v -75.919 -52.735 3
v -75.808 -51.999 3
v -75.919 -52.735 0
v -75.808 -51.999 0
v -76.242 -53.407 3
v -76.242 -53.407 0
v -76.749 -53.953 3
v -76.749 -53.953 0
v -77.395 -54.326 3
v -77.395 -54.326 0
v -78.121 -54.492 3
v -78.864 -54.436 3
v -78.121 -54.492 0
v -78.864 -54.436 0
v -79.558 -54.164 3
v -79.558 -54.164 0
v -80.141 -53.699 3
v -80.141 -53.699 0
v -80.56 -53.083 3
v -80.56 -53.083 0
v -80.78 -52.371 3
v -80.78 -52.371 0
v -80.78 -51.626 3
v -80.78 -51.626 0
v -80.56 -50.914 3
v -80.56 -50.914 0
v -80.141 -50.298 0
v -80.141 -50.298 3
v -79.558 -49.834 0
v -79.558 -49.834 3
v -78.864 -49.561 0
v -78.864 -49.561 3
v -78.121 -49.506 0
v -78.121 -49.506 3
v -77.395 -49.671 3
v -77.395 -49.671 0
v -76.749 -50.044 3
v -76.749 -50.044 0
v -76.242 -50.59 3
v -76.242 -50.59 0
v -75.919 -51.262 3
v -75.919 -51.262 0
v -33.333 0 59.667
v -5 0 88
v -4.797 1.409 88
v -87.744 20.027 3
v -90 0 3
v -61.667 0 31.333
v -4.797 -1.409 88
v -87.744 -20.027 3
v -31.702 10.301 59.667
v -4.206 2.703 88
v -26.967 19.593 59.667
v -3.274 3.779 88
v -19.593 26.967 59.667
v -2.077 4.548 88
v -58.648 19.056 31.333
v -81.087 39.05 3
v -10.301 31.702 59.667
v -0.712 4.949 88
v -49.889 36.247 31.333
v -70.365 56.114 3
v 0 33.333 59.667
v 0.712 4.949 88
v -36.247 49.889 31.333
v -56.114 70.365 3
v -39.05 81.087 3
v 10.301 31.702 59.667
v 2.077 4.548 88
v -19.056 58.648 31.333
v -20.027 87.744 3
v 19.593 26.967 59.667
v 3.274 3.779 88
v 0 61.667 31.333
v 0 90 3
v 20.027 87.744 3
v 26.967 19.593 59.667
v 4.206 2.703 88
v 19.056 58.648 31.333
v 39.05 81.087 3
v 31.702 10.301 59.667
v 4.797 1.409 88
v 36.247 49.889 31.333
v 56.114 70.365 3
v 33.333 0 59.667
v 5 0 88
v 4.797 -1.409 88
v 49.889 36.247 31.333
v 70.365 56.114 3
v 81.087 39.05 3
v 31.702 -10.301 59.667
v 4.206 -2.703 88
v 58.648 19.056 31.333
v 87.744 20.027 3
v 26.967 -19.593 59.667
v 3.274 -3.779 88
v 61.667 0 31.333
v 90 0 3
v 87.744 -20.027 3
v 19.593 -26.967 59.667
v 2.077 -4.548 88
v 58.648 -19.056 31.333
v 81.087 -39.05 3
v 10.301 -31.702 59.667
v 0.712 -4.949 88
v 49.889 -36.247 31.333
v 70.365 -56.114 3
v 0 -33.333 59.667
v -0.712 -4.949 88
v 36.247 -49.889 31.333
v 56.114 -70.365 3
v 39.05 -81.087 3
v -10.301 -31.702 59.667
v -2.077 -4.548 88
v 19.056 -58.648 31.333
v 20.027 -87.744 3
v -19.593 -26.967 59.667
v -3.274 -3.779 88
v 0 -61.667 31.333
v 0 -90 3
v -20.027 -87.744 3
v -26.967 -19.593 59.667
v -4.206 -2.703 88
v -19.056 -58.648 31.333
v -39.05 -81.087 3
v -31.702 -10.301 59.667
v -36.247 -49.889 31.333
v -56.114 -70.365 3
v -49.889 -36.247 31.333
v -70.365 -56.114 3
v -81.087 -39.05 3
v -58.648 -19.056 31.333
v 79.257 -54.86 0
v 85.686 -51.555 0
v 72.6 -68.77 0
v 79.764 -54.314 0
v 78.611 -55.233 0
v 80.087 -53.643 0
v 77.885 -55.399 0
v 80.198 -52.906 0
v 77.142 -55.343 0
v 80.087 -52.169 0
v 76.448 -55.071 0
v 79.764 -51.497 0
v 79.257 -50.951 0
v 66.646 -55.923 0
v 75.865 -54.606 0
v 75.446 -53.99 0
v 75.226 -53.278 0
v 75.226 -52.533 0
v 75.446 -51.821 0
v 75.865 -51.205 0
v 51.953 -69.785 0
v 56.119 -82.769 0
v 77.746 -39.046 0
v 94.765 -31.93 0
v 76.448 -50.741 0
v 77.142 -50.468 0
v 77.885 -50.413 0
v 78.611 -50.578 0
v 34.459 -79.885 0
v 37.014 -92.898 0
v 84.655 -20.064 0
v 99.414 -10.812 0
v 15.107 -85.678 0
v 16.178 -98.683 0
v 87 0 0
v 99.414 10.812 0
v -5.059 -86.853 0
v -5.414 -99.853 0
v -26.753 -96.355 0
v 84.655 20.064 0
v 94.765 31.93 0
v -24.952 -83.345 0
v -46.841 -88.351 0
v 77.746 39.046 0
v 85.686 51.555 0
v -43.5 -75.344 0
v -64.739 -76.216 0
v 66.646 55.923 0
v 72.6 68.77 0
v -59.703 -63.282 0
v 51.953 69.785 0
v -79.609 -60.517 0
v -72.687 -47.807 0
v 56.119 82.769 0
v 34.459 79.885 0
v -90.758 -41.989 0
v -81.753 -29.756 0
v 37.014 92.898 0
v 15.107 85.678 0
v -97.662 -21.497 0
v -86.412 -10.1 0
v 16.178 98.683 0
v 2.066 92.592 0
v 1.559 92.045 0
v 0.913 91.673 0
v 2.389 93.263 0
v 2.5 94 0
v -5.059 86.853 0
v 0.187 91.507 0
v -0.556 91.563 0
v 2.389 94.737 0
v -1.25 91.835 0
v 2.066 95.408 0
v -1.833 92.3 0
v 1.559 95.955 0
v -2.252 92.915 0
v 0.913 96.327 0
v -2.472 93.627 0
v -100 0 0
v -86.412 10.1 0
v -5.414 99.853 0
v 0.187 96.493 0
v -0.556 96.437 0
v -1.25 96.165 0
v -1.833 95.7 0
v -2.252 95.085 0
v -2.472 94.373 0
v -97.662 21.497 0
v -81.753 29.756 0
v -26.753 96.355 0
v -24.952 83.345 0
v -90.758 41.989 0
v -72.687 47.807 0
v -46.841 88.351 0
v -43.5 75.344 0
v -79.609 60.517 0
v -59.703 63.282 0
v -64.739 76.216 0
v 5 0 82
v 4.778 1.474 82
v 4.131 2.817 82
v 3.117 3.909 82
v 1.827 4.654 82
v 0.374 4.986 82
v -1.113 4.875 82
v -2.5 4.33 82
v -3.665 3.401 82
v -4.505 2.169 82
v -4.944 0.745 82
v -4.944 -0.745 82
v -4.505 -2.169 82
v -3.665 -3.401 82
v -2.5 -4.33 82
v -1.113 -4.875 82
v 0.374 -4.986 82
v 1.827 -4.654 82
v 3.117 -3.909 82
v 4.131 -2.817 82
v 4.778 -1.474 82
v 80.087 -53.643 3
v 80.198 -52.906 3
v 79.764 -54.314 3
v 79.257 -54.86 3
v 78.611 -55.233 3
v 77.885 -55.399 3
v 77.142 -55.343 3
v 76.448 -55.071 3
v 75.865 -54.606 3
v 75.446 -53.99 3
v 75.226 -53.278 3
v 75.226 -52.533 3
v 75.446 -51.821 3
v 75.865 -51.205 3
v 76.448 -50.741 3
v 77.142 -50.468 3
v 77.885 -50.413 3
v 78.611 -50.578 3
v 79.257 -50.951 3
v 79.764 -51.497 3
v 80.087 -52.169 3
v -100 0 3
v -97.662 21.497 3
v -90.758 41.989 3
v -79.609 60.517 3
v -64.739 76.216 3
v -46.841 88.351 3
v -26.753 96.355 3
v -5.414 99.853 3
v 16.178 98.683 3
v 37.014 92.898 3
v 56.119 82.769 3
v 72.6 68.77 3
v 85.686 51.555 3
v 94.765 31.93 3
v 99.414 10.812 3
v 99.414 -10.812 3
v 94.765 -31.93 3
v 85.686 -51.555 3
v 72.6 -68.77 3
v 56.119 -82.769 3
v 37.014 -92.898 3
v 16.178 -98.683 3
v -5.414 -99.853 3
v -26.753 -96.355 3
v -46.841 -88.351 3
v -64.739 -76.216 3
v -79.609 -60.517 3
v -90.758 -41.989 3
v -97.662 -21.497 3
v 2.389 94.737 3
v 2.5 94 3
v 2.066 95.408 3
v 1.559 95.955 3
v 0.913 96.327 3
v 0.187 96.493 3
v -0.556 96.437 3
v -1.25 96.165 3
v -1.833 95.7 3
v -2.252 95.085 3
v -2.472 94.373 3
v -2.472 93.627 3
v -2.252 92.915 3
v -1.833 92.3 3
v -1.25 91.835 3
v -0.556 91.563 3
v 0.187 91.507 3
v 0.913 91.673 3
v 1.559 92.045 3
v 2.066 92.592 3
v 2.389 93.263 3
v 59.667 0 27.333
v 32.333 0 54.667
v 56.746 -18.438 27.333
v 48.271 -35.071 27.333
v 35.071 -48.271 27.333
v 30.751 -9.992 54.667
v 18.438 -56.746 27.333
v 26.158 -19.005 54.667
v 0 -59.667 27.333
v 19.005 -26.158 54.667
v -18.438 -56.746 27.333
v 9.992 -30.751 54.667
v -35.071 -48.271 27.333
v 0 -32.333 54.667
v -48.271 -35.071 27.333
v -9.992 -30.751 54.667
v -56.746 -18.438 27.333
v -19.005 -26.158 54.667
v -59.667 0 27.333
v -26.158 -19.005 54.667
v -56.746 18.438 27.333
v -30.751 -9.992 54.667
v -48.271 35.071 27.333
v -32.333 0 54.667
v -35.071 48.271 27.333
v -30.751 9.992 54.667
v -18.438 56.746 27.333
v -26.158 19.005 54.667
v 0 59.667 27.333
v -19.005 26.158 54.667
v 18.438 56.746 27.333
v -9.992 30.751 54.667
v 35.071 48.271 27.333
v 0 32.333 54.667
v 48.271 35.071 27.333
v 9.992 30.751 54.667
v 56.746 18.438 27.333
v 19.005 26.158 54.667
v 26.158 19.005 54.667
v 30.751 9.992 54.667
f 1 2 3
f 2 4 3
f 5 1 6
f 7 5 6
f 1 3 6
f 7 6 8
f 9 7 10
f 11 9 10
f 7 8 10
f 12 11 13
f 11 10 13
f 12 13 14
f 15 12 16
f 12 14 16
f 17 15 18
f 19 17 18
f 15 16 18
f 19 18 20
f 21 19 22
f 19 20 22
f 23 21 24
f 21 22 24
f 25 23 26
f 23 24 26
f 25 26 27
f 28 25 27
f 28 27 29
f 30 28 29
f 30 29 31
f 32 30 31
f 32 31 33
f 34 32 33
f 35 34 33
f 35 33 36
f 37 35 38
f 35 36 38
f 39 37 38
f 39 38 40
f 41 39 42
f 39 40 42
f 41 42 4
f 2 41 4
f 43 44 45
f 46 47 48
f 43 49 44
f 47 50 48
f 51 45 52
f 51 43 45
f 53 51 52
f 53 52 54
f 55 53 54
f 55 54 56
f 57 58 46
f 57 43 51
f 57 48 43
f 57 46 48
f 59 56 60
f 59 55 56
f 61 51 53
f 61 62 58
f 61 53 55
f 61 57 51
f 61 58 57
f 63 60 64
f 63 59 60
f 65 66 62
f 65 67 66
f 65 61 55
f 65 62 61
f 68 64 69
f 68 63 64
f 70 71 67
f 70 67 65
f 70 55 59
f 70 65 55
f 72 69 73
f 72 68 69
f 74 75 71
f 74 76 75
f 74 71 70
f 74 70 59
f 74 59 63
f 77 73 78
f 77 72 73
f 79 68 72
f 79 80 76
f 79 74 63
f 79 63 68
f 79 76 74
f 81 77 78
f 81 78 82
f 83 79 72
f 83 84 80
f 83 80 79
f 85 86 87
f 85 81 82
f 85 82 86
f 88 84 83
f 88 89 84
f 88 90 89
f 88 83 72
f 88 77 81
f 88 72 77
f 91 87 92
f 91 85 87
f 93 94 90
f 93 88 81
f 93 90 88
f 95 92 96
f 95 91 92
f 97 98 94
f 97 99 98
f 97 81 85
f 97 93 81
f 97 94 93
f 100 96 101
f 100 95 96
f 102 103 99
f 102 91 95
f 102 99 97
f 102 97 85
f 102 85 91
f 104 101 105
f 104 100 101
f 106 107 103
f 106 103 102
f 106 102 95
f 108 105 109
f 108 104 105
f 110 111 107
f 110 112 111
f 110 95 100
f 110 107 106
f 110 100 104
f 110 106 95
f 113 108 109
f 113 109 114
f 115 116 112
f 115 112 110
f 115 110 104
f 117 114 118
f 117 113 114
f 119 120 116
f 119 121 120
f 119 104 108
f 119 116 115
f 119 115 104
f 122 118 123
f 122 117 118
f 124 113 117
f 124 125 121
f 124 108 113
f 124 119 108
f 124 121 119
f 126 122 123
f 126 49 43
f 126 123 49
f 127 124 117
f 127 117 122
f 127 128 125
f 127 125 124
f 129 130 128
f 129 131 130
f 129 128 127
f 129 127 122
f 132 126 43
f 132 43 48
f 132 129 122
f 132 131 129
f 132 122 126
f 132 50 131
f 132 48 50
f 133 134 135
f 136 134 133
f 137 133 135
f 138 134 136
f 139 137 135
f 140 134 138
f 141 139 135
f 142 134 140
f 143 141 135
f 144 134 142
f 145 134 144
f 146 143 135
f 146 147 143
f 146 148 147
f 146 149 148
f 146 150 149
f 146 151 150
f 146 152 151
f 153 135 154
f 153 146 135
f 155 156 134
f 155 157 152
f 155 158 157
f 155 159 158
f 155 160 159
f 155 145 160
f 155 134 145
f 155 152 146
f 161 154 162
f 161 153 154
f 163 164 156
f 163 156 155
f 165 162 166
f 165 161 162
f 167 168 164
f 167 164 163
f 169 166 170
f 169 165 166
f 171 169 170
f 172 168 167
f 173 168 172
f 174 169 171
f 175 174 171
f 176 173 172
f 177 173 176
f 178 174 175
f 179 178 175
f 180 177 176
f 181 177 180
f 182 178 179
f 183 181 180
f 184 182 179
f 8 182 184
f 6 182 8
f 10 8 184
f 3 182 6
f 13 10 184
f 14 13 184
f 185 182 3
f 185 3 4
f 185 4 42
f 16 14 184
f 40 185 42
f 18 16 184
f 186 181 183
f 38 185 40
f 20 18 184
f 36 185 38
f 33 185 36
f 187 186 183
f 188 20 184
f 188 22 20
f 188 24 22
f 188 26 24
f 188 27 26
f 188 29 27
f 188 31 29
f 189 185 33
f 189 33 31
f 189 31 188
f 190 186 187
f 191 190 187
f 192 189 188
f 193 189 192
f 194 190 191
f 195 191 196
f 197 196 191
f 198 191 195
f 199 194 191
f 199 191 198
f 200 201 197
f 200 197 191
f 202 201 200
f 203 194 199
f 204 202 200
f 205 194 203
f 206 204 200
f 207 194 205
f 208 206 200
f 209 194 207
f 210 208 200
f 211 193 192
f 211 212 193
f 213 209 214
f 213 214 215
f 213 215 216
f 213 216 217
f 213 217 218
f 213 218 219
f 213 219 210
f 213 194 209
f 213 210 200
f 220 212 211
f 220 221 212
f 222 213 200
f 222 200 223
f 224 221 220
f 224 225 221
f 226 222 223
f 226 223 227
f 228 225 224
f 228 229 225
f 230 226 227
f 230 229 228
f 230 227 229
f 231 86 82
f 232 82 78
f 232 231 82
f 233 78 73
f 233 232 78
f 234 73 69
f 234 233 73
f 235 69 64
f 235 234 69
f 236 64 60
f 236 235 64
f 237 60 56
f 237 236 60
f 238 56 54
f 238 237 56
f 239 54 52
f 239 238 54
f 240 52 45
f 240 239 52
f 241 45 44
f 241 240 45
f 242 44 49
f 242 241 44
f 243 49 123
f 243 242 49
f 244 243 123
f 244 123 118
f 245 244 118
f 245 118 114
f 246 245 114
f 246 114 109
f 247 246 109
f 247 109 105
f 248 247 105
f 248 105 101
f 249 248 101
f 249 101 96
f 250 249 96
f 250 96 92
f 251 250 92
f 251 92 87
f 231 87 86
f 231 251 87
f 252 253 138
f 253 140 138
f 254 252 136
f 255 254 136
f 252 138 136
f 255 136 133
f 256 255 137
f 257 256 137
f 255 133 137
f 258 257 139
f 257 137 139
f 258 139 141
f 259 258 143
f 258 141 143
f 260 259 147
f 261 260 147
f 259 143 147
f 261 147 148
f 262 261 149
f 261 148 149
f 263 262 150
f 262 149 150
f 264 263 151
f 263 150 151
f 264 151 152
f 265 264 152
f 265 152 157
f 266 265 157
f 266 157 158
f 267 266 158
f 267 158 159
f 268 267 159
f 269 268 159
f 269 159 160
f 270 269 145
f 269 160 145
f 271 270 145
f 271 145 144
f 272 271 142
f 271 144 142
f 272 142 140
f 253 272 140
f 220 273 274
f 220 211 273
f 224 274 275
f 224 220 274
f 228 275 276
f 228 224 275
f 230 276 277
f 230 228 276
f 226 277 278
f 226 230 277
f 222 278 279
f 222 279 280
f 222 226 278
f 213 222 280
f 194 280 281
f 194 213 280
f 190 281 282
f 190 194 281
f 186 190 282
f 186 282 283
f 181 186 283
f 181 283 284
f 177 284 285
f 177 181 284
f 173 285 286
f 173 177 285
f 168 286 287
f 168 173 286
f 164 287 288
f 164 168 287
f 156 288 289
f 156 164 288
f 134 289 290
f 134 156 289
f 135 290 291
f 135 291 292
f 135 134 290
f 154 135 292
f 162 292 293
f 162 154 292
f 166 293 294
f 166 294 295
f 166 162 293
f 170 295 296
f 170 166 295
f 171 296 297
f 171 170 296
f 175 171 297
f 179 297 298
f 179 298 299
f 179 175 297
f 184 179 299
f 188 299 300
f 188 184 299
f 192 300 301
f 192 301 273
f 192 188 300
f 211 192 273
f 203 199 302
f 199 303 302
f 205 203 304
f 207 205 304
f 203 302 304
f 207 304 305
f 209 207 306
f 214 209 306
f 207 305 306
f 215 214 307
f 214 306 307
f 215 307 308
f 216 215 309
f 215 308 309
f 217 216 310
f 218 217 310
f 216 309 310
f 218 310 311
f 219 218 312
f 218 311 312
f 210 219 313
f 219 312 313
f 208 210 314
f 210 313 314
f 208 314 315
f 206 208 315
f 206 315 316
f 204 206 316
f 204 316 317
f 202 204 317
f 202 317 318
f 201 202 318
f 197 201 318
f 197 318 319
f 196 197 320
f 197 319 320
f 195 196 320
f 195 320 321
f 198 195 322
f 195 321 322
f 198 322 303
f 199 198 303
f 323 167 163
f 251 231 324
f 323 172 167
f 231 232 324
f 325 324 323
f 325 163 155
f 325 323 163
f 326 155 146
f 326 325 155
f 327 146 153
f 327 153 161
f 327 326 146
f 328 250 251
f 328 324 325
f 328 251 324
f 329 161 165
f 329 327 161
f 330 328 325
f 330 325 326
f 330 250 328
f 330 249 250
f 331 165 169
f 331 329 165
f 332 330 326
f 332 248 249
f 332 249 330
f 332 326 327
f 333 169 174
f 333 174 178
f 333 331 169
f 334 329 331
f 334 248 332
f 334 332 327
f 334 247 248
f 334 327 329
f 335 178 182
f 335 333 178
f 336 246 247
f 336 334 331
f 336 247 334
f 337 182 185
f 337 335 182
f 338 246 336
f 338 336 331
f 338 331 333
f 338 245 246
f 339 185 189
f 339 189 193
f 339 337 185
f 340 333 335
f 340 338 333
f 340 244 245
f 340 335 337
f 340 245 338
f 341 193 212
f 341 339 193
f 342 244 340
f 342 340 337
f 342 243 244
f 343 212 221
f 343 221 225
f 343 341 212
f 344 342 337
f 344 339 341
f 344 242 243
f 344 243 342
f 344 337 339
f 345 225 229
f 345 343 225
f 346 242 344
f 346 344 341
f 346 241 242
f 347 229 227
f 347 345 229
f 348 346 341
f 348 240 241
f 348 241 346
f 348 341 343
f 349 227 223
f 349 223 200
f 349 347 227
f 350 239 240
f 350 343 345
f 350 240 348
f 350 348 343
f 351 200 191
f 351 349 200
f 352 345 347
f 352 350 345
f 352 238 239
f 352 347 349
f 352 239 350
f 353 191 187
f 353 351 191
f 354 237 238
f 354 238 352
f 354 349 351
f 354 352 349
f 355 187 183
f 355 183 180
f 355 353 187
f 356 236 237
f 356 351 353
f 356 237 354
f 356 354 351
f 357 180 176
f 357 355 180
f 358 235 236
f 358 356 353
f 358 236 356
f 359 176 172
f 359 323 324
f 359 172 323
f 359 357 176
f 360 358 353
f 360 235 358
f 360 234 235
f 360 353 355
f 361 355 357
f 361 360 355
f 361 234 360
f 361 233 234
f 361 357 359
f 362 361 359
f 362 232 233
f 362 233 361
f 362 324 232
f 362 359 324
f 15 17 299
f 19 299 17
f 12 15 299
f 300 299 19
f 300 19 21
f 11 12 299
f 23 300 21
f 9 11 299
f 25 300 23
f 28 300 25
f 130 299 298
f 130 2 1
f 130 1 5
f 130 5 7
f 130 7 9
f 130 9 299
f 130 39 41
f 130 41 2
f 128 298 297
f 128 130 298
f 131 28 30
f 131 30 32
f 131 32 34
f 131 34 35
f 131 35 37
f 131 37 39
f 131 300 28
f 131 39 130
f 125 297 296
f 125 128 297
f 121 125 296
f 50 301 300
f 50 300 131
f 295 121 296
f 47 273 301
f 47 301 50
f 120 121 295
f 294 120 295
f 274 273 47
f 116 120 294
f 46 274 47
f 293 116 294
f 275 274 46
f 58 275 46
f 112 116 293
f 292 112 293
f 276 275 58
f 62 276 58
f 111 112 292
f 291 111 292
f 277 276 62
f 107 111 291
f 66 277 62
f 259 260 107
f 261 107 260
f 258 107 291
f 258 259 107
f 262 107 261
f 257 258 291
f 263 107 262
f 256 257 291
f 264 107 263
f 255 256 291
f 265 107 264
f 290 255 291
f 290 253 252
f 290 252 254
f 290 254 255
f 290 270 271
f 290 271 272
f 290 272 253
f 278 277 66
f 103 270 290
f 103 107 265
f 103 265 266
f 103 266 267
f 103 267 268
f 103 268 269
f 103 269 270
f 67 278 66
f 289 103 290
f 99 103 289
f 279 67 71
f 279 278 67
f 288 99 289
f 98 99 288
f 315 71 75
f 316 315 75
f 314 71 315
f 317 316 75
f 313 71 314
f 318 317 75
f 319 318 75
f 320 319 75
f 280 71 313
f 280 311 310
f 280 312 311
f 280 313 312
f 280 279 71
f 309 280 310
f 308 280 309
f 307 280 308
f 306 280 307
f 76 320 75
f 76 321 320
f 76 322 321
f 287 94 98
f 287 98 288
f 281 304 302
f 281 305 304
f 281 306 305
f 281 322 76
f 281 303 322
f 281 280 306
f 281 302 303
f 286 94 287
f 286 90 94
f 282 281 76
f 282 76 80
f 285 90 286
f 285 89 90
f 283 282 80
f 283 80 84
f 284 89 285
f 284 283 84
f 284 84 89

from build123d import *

# Parameters (mm, degrees)
F2_R      = 87
F4_R      = 5
F5_DEPTH  = 93.001
F6_R      = 2.5
F7_DEPTH  = 12.5
F8_R      = 2.5
F9_DEPTH  = 12.5
F10_R     = 2.5
F11_DEPTH = 12.5


# Not quite as in the source:
# - an extrude whose draft closes it to a point is written as a loft to that point


with BuildPart() as f1:
    # F0 (on Front) → F1 (revolve)
    with BuildSketch(Plane.XZ):
        Polygon((-100, 0), (0, 0), (0, 93), (-90, 3), (-100, 3), align=None)
    revolve(axis=Axis((0, 0, 46.5), (0, 0, -1)))

    # F2 (on face) → F3 section 0
    with BuildSketch(Plane(origin=(0, 0, 0), x_dir=(1, 0, 0), z_dir=(0, 0, -1)), mode=Mode.PRIVATE) as f3_s0:
        Circle(F2_R)
    loft([f3_s0.sketch, Vertex(0, 0, 87)], ruled=True, mode=Mode.SUBTRACT)

    # F4 (on Top) → F5 (cut, through all)
    with BuildSketch(Plane.XY):
        Circle(F4_R)
    extrude(amount=F5_DEPTH, mode=Mode.SUBTRACT)

    # F6 (on face) → F7 (cut, symmetric)
    with BuildSketch(Plane.XY.offset(3)):
        with Locations((0, 94)):
            Circle(F6_R)
    extrude(amount=F7_DEPTH, both=True, mode=Mode.SUBTRACT)

    # F8 (on face) → F9 (cut, symmetric)
    with BuildSketch(Plane(origin=(0, 0, 0), x_dir=(1, 0, 0), z_dir=(0, 0, -1))):
        with Locations((-78.3080390386, 51.9985674988)):
            Circle(F8_R)
    extrude(amount=F9_DEPTH, both=True, mode=Mode.SUBTRACT)

    # F10 (on face) → F11 (cut, symmetric)
    with BuildSketch(Plane(origin=(0, 0, 0), x_dir=(1, 0, 0), z_dir=(0, 0, -1))):
        with Locations((77.6980827138, 52.9056513294)):
            Circle(F10_R)
    extrude(amount=F11_DEPTH, both=True, mode=Mode.SUBTRACT)


solid = f1.part
